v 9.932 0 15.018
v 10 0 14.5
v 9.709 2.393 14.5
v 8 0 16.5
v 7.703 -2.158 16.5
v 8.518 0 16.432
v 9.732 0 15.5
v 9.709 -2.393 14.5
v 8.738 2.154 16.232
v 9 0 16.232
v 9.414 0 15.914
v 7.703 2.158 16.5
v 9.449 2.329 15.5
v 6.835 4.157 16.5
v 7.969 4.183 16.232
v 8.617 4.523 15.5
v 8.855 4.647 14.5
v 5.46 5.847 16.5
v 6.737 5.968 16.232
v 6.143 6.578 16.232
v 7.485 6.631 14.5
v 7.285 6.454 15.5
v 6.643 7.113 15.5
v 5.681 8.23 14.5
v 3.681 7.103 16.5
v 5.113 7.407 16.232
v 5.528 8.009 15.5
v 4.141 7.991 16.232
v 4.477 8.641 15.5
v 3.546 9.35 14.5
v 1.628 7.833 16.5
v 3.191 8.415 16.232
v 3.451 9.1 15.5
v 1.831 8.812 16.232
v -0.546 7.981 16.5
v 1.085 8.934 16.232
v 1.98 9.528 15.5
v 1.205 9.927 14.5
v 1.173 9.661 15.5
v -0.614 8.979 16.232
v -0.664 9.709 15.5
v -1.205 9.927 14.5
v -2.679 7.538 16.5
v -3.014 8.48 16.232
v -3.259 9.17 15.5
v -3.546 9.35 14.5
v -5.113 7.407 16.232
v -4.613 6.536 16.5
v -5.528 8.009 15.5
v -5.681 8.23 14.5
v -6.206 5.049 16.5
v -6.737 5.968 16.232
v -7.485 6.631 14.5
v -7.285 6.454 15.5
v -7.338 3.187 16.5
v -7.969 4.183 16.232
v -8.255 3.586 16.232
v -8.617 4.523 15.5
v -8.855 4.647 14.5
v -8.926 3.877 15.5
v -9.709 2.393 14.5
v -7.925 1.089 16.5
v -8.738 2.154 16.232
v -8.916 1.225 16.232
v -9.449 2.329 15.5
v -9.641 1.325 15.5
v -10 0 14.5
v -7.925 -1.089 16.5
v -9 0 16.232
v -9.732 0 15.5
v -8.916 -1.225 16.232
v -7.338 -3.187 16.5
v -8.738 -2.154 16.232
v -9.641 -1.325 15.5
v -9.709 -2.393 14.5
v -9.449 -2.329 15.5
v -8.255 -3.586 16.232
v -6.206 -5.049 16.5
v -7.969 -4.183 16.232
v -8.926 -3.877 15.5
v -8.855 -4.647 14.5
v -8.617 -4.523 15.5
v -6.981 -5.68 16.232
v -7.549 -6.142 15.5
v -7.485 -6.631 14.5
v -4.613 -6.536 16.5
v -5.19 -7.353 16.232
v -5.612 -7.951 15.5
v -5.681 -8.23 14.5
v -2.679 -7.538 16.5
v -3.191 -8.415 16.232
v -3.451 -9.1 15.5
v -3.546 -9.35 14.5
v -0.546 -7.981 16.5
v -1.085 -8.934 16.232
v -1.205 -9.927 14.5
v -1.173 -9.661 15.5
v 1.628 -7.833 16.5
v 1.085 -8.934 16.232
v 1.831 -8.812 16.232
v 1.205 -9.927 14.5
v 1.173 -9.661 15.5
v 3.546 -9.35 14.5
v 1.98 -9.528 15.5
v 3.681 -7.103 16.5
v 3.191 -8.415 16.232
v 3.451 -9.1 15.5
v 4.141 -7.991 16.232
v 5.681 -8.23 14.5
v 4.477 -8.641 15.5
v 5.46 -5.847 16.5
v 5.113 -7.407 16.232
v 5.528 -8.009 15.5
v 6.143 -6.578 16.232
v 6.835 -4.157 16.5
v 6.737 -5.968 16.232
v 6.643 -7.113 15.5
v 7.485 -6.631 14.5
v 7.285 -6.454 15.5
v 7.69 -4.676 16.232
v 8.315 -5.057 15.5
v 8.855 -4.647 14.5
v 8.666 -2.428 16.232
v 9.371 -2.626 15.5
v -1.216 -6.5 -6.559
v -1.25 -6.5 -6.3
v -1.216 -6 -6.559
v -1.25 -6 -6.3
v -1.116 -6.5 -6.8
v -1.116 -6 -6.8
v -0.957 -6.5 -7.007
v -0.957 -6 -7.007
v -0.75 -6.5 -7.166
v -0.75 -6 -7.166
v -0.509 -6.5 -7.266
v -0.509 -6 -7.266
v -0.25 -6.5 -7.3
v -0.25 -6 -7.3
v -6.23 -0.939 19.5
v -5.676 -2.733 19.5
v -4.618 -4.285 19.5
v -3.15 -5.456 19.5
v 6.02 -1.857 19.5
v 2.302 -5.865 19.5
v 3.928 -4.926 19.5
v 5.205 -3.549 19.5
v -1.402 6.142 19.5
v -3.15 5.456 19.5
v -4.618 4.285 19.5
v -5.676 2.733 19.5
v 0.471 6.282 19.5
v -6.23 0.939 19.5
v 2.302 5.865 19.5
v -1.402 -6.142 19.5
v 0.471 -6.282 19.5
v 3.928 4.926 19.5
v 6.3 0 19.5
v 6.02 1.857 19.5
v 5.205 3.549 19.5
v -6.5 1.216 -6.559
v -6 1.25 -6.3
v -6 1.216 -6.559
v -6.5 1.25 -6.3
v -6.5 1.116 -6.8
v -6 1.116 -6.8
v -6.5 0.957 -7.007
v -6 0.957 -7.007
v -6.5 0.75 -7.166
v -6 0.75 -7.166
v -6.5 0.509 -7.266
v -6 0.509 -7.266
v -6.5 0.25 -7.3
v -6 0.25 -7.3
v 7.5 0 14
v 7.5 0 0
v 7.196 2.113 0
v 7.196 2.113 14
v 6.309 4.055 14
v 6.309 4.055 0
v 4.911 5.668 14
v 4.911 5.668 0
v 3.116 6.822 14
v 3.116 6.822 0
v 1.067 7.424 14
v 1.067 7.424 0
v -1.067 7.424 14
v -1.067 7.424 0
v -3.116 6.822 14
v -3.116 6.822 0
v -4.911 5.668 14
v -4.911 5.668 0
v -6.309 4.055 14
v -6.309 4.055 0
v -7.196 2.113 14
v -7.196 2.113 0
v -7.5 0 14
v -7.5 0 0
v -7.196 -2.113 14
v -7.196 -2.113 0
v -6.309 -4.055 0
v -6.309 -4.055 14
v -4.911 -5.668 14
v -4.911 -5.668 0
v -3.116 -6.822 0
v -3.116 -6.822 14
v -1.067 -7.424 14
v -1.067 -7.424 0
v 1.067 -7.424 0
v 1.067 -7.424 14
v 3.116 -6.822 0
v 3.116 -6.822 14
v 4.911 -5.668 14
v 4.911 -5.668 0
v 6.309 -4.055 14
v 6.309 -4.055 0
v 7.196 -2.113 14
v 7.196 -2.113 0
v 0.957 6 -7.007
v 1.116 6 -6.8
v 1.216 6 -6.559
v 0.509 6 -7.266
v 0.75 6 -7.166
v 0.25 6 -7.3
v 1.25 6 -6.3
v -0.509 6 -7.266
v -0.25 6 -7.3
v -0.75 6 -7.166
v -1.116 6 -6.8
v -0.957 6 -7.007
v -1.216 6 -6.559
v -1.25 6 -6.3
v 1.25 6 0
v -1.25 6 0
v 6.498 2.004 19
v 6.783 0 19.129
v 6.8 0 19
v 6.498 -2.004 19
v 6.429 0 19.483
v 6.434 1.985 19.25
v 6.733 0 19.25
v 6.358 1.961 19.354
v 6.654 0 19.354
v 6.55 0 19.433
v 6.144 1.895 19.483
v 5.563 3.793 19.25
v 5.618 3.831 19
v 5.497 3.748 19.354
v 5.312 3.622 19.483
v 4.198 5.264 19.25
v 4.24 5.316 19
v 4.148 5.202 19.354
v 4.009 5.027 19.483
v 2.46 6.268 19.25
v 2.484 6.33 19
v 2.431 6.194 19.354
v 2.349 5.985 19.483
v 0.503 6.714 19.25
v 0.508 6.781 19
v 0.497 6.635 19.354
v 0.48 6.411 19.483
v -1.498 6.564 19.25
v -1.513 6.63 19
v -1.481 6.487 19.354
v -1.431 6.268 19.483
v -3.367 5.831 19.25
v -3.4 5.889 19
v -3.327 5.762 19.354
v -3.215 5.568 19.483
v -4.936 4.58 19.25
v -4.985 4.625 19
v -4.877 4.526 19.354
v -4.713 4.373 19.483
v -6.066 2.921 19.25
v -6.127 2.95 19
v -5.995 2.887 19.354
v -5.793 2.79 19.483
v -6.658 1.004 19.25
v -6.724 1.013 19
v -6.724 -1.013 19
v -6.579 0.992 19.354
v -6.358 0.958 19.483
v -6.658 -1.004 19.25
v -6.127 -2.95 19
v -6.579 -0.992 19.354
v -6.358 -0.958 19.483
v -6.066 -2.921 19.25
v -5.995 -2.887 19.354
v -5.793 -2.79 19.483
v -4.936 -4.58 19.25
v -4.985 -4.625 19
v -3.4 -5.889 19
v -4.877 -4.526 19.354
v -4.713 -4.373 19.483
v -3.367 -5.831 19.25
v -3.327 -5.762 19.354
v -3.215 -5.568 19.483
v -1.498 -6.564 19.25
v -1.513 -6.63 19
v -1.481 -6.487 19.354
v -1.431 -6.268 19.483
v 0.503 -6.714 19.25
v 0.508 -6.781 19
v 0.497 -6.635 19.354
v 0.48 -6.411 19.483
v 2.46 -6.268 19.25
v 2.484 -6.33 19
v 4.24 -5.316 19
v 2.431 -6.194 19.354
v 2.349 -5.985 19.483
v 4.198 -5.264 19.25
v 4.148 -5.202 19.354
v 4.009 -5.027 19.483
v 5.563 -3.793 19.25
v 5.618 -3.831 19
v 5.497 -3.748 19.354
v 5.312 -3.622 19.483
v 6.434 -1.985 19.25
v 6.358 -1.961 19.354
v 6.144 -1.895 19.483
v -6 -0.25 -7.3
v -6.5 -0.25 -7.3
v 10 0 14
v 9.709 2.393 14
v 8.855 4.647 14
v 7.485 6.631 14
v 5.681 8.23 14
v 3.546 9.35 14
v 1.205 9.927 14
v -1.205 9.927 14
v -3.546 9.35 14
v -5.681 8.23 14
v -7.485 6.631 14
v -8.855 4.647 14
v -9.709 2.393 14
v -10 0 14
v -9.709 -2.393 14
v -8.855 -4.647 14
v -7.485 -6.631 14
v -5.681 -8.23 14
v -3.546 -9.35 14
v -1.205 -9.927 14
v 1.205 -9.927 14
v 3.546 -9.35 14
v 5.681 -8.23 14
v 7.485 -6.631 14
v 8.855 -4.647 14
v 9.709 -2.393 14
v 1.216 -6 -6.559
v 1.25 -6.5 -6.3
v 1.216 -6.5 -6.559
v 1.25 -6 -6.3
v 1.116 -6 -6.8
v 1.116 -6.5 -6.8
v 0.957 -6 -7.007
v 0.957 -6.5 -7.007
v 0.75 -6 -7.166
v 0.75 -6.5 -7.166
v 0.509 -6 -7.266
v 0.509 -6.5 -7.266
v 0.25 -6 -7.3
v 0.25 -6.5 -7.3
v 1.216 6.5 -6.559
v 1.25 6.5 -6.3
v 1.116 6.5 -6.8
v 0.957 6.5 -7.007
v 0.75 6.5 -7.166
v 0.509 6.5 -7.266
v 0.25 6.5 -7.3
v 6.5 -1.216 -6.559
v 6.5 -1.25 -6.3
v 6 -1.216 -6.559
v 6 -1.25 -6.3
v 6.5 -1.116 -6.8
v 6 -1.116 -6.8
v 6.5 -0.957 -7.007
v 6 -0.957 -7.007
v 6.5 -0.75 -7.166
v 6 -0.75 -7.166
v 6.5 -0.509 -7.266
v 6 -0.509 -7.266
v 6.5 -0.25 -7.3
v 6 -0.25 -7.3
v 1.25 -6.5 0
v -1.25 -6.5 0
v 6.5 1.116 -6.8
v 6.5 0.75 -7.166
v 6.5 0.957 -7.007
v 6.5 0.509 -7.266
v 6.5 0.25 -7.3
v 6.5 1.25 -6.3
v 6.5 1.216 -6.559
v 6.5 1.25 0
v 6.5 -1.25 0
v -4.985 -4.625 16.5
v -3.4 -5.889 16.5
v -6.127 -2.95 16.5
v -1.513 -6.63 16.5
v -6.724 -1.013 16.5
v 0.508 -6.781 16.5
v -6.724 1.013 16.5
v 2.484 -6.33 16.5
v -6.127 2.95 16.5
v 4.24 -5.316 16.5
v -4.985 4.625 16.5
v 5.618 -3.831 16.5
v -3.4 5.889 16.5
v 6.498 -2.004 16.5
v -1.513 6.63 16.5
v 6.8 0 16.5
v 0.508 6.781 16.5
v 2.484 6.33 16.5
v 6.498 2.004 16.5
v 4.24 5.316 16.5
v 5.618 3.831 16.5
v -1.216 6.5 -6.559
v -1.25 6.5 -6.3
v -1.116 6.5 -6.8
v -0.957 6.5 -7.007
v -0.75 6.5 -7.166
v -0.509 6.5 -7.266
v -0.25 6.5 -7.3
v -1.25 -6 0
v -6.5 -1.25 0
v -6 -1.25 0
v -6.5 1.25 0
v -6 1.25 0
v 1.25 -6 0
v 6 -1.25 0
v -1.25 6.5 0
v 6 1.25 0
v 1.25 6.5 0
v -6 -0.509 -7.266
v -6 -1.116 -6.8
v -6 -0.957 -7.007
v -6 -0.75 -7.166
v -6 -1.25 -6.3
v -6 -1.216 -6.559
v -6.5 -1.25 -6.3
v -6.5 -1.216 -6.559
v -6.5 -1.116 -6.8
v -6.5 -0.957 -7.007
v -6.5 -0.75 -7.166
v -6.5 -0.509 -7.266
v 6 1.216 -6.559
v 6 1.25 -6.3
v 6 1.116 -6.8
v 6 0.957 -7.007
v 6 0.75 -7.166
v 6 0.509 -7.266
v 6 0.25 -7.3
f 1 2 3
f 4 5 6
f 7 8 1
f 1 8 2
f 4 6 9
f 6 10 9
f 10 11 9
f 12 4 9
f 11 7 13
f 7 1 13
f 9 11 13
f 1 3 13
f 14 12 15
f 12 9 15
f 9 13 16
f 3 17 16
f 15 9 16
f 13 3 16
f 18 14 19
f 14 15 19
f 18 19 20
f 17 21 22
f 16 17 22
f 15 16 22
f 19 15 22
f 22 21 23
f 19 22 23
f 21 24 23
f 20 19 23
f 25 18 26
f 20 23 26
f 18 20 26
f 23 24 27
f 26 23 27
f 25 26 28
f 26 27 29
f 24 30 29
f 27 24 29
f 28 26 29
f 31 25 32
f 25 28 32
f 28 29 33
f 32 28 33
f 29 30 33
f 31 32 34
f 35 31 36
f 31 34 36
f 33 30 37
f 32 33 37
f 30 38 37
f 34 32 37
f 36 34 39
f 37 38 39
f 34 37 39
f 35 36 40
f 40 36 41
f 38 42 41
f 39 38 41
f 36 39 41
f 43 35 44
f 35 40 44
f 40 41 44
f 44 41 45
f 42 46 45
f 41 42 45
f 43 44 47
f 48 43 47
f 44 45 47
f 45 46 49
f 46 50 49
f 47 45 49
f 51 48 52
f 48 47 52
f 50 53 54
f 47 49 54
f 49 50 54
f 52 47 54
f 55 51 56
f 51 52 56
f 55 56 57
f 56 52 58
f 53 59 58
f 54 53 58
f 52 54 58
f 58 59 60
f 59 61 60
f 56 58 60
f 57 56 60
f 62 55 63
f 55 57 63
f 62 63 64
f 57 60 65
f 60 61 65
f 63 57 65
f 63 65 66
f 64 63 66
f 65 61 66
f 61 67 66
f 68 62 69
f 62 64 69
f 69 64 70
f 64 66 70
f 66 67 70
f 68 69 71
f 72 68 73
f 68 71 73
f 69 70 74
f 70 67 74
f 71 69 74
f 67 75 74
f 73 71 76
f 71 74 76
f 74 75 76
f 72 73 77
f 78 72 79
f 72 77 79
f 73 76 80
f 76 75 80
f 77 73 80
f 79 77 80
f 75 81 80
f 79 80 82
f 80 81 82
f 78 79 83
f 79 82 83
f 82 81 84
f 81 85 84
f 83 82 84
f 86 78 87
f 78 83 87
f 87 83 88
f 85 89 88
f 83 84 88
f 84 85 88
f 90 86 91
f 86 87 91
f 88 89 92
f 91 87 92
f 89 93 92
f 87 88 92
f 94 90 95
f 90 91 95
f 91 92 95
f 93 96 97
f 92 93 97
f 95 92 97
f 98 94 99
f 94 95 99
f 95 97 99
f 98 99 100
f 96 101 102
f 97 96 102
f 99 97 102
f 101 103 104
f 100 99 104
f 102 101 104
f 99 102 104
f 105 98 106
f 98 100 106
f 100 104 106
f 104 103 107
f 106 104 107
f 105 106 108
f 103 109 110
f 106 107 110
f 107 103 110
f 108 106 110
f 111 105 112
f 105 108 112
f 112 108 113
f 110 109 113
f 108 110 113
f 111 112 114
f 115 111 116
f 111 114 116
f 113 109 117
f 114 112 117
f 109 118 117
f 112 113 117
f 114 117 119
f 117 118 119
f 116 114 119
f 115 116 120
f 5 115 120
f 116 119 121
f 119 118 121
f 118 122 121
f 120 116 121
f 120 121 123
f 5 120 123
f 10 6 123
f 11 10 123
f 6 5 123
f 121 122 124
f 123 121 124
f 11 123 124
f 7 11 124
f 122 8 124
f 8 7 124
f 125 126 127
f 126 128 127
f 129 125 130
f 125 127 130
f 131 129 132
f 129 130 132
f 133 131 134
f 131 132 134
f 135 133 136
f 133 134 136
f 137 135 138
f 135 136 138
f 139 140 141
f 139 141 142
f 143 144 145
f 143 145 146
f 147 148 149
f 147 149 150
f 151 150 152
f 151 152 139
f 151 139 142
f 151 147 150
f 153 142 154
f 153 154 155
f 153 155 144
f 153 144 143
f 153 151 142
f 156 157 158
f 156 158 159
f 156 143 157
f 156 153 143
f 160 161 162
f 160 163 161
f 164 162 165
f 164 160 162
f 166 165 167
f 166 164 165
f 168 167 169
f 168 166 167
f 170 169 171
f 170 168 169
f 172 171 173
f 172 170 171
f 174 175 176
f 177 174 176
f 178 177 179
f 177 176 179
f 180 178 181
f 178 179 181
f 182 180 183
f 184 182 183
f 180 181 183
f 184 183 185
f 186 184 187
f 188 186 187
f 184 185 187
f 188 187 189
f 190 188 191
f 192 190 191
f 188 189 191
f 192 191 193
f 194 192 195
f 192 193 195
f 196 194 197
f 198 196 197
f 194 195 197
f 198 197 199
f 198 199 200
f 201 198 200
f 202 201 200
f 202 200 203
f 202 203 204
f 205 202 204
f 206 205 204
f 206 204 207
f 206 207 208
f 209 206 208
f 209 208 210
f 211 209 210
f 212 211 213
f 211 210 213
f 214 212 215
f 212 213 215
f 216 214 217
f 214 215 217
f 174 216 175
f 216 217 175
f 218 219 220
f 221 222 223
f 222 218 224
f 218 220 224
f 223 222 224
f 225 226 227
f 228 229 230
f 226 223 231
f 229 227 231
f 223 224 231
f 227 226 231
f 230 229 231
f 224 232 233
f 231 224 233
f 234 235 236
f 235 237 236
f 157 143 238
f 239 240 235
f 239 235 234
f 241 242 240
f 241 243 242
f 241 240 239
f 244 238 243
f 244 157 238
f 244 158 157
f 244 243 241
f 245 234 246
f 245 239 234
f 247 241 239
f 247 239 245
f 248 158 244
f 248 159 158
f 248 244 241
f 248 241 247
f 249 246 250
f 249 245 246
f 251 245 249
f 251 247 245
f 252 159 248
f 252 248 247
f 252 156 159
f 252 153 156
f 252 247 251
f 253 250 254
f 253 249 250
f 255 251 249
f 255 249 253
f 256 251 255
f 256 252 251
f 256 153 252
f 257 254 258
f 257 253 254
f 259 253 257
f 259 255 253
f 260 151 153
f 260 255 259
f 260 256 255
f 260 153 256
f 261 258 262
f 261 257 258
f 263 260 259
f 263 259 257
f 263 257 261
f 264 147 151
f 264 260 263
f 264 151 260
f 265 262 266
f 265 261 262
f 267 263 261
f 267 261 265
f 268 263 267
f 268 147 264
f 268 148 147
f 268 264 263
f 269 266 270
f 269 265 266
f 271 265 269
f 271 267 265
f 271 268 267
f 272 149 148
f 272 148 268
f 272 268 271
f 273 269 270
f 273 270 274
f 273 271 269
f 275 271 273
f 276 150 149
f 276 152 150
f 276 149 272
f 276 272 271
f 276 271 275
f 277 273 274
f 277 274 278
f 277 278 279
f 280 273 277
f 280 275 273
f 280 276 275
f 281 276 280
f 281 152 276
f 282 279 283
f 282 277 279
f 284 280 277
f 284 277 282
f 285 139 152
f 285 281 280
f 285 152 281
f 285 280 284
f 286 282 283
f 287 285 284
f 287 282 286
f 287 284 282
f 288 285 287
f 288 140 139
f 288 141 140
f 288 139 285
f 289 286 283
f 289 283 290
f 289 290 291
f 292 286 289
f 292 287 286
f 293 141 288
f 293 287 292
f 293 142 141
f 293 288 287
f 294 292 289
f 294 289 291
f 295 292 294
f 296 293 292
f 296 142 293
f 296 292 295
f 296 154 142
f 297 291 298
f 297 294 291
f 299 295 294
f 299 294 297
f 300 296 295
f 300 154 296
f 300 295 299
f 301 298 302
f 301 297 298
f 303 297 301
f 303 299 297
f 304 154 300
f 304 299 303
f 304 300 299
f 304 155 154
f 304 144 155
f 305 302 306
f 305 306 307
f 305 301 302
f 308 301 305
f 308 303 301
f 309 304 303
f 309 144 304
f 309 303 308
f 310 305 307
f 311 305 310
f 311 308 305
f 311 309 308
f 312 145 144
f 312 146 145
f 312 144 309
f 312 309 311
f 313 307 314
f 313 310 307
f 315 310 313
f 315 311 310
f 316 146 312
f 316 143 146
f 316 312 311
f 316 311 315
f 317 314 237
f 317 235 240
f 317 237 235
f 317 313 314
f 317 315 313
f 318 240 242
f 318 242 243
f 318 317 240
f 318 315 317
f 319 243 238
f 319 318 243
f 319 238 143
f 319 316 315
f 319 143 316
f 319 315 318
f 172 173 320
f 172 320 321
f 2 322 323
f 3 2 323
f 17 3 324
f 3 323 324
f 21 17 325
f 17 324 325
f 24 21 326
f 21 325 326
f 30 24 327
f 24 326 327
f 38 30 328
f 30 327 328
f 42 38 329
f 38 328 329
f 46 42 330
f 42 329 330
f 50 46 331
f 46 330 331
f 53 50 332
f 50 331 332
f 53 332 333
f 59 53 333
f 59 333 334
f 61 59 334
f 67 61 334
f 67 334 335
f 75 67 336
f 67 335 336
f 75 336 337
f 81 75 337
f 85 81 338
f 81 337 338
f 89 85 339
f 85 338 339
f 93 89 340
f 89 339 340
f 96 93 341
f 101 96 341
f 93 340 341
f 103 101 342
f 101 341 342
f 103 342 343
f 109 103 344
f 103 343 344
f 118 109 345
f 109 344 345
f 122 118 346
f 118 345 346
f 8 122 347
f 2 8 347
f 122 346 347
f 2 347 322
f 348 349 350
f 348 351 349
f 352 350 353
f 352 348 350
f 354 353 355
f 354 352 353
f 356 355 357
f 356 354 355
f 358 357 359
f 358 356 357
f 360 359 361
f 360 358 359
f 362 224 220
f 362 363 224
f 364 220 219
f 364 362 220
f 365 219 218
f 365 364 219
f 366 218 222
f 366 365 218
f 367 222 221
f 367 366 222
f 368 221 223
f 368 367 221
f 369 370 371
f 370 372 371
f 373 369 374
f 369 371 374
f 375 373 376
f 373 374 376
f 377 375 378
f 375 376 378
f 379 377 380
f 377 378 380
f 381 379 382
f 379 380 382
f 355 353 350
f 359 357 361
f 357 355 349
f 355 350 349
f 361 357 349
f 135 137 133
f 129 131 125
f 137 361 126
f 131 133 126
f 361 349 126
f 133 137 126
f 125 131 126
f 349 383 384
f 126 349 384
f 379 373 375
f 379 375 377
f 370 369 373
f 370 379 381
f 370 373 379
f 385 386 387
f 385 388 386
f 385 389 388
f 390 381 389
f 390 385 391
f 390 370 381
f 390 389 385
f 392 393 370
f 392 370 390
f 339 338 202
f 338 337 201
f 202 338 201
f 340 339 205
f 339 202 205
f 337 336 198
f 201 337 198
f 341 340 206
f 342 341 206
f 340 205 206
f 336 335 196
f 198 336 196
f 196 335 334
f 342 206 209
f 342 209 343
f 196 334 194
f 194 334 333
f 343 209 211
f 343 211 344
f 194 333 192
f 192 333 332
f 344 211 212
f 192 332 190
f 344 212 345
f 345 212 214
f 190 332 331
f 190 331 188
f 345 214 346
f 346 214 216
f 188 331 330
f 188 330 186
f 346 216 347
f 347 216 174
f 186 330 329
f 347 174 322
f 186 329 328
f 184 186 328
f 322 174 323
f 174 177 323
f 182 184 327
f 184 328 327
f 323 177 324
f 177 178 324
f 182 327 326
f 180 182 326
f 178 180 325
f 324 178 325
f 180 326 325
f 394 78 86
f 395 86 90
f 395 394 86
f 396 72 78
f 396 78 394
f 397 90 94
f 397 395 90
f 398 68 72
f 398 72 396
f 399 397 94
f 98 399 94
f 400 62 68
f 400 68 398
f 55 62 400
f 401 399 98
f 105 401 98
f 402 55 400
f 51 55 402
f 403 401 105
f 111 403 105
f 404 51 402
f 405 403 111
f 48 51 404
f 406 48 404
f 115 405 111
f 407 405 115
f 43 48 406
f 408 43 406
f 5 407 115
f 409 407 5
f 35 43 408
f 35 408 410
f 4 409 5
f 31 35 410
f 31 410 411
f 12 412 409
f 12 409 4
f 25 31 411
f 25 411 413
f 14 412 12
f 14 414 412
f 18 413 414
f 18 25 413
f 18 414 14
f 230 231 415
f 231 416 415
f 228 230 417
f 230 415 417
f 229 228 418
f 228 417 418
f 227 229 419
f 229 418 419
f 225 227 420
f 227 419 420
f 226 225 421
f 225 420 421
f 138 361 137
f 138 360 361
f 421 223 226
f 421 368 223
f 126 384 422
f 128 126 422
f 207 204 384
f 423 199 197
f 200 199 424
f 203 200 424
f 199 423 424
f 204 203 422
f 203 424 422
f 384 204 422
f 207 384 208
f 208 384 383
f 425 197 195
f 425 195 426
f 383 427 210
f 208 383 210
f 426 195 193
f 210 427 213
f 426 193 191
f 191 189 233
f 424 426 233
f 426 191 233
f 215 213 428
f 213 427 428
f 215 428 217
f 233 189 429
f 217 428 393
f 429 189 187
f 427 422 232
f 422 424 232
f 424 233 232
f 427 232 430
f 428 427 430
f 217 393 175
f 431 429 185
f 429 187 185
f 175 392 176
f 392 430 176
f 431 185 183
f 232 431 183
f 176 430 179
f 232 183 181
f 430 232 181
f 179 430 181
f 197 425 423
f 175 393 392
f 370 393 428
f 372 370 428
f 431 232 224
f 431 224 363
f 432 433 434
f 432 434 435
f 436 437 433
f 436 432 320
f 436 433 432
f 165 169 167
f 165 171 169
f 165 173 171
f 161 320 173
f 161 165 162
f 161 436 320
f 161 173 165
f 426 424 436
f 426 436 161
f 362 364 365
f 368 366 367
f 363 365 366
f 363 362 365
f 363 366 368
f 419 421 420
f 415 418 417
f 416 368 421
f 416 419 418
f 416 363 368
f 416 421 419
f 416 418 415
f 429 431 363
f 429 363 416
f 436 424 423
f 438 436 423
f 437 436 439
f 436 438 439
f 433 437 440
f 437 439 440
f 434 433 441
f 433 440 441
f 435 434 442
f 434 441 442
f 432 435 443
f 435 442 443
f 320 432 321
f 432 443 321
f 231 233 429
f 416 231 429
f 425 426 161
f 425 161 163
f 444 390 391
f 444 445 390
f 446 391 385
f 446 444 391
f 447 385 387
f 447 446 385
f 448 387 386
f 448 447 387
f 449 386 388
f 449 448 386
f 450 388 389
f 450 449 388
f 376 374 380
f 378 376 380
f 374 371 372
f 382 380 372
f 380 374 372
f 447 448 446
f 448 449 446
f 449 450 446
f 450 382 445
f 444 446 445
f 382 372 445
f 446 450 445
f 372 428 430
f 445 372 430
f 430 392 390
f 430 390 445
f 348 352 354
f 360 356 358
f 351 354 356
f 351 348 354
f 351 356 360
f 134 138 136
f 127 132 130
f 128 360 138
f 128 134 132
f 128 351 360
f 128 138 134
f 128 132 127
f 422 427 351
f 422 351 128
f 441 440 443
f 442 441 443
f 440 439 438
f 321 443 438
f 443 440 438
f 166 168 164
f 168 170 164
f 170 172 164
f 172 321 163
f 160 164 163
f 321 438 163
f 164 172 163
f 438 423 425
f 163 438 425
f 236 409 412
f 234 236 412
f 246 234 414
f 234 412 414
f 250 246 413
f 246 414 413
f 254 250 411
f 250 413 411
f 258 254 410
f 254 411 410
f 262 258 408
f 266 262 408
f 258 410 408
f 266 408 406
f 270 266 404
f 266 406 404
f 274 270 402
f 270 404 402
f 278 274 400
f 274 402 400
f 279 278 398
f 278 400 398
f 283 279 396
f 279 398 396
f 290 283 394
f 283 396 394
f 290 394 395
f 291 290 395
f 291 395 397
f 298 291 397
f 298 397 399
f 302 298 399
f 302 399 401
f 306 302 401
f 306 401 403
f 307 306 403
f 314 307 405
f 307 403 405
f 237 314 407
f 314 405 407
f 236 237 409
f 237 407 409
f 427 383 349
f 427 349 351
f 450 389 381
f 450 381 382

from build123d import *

# Parameters (mm, degrees)
SKETCH_1_R      = 7.5
EXTRUDE_1_DEPTH = 14
SKETCH_2_R      = 10
EXTRUDE_2_DEPTH = 2.5
SKETCH_3_R      = 6.8
EXTRUDE_3_DEPTH = 3
SKETCH_4_W      = 0.5
SKETCH_4_H      = 2.5
SKETCH_4_W_2    = 2.5
SKETCH_4_H_2    = 0.5
EXTRUDE_4_DEPTH = 7.3
FILLET_1_R      = 1
FILLET_2_R      = 0.5
FILLET_3_R      = 2


with BuildPart() as part:
    # ｽｹｯﾁ1 → ﾎﾞｽ - 押し出し1 (new body)
    with BuildSketch(Plane.XY):
        Circle(SKETCH_1_R)
    extrude(amount=EXTRUDE_1_DEPTH)

    # ｽｹｯﾁ2 → ﾎﾞｽ - 押し出し2 (add)
    with BuildSketch(Plane.XY.offset(14)):
        Circle(SKETCH_2_R)
    extrude(amount=EXTRUDE_2_DEPTH)

    # ｽｹｯﾁ3 → ﾎﾞｽ - 押し出し3 (add)
    with BuildSketch(Plane.XY.offset(16.5)):
        Circle(SKETCH_3_R)
    extrude(amount=EXTRUDE_3_DEPTH)

    # ｽｹｯﾁ4 → ﾎﾞｽ - 押し出し4 (add)
    with BuildSketch(Plane(origin=(0, 0, 0), x_dir=(-1, 0, 0), z_dir=(0, 0, -1))):
        with Locations((-6.25, 0)):
            Rectangle(SKETCH_4_W, SKETCH_4_H)
        with Locations((6.25, 0)):
            Rectangle(SKETCH_4_W, SKETCH_4_H)
        with Locations((0, 6.25)):
            Rectangle(SKETCH_4_W_2, SKETCH_4_H_2)
        with Locations((0, -6.25)):
            Rectangle(SKETCH_4_W_2, SKETCH_4_H_2)
    extrude(amount=EXTRUDE_4_DEPTH)

    # ﾌｨﾚｯﾄ1
    fillet_1_edges = [part.edges().sort_by_distance(p)[0] for p in [
        (6.25, 1.25, -7.3),
        (6.25, -1.25, -7.3),
        (-6.25, -1.25, -7.3),
        (-6.25, 1.25, -7.3),
        (-1.25, 6.25, -7.3),
        (1.25, 6.25, -7.3),
        (-1.25, -6.25, -7.3),
        (1.25, -6.25, -7.3),
    ]]
    fillet(fillet_1_edges, radius=FILLET_1_R)

    # ﾌｨﾚｯﾄ2
    fillet_2_edges = [part.edges().sort_by_distance(p)[0] for p in [
        (-6.8, 0, 19.5),
    ]]
    fillet(fillet_2_edges, radius=FILLET_2_R)

    # ﾌｨﾚｯﾄ3
    fillet_3_edges = [part.edges().sort_by_distance(p)[0] for p in [
        (-10, 0, 16.5),
    ]]
    fillet(fillet_3_edges, radius=FILLET_3_R)


solid = part.part
